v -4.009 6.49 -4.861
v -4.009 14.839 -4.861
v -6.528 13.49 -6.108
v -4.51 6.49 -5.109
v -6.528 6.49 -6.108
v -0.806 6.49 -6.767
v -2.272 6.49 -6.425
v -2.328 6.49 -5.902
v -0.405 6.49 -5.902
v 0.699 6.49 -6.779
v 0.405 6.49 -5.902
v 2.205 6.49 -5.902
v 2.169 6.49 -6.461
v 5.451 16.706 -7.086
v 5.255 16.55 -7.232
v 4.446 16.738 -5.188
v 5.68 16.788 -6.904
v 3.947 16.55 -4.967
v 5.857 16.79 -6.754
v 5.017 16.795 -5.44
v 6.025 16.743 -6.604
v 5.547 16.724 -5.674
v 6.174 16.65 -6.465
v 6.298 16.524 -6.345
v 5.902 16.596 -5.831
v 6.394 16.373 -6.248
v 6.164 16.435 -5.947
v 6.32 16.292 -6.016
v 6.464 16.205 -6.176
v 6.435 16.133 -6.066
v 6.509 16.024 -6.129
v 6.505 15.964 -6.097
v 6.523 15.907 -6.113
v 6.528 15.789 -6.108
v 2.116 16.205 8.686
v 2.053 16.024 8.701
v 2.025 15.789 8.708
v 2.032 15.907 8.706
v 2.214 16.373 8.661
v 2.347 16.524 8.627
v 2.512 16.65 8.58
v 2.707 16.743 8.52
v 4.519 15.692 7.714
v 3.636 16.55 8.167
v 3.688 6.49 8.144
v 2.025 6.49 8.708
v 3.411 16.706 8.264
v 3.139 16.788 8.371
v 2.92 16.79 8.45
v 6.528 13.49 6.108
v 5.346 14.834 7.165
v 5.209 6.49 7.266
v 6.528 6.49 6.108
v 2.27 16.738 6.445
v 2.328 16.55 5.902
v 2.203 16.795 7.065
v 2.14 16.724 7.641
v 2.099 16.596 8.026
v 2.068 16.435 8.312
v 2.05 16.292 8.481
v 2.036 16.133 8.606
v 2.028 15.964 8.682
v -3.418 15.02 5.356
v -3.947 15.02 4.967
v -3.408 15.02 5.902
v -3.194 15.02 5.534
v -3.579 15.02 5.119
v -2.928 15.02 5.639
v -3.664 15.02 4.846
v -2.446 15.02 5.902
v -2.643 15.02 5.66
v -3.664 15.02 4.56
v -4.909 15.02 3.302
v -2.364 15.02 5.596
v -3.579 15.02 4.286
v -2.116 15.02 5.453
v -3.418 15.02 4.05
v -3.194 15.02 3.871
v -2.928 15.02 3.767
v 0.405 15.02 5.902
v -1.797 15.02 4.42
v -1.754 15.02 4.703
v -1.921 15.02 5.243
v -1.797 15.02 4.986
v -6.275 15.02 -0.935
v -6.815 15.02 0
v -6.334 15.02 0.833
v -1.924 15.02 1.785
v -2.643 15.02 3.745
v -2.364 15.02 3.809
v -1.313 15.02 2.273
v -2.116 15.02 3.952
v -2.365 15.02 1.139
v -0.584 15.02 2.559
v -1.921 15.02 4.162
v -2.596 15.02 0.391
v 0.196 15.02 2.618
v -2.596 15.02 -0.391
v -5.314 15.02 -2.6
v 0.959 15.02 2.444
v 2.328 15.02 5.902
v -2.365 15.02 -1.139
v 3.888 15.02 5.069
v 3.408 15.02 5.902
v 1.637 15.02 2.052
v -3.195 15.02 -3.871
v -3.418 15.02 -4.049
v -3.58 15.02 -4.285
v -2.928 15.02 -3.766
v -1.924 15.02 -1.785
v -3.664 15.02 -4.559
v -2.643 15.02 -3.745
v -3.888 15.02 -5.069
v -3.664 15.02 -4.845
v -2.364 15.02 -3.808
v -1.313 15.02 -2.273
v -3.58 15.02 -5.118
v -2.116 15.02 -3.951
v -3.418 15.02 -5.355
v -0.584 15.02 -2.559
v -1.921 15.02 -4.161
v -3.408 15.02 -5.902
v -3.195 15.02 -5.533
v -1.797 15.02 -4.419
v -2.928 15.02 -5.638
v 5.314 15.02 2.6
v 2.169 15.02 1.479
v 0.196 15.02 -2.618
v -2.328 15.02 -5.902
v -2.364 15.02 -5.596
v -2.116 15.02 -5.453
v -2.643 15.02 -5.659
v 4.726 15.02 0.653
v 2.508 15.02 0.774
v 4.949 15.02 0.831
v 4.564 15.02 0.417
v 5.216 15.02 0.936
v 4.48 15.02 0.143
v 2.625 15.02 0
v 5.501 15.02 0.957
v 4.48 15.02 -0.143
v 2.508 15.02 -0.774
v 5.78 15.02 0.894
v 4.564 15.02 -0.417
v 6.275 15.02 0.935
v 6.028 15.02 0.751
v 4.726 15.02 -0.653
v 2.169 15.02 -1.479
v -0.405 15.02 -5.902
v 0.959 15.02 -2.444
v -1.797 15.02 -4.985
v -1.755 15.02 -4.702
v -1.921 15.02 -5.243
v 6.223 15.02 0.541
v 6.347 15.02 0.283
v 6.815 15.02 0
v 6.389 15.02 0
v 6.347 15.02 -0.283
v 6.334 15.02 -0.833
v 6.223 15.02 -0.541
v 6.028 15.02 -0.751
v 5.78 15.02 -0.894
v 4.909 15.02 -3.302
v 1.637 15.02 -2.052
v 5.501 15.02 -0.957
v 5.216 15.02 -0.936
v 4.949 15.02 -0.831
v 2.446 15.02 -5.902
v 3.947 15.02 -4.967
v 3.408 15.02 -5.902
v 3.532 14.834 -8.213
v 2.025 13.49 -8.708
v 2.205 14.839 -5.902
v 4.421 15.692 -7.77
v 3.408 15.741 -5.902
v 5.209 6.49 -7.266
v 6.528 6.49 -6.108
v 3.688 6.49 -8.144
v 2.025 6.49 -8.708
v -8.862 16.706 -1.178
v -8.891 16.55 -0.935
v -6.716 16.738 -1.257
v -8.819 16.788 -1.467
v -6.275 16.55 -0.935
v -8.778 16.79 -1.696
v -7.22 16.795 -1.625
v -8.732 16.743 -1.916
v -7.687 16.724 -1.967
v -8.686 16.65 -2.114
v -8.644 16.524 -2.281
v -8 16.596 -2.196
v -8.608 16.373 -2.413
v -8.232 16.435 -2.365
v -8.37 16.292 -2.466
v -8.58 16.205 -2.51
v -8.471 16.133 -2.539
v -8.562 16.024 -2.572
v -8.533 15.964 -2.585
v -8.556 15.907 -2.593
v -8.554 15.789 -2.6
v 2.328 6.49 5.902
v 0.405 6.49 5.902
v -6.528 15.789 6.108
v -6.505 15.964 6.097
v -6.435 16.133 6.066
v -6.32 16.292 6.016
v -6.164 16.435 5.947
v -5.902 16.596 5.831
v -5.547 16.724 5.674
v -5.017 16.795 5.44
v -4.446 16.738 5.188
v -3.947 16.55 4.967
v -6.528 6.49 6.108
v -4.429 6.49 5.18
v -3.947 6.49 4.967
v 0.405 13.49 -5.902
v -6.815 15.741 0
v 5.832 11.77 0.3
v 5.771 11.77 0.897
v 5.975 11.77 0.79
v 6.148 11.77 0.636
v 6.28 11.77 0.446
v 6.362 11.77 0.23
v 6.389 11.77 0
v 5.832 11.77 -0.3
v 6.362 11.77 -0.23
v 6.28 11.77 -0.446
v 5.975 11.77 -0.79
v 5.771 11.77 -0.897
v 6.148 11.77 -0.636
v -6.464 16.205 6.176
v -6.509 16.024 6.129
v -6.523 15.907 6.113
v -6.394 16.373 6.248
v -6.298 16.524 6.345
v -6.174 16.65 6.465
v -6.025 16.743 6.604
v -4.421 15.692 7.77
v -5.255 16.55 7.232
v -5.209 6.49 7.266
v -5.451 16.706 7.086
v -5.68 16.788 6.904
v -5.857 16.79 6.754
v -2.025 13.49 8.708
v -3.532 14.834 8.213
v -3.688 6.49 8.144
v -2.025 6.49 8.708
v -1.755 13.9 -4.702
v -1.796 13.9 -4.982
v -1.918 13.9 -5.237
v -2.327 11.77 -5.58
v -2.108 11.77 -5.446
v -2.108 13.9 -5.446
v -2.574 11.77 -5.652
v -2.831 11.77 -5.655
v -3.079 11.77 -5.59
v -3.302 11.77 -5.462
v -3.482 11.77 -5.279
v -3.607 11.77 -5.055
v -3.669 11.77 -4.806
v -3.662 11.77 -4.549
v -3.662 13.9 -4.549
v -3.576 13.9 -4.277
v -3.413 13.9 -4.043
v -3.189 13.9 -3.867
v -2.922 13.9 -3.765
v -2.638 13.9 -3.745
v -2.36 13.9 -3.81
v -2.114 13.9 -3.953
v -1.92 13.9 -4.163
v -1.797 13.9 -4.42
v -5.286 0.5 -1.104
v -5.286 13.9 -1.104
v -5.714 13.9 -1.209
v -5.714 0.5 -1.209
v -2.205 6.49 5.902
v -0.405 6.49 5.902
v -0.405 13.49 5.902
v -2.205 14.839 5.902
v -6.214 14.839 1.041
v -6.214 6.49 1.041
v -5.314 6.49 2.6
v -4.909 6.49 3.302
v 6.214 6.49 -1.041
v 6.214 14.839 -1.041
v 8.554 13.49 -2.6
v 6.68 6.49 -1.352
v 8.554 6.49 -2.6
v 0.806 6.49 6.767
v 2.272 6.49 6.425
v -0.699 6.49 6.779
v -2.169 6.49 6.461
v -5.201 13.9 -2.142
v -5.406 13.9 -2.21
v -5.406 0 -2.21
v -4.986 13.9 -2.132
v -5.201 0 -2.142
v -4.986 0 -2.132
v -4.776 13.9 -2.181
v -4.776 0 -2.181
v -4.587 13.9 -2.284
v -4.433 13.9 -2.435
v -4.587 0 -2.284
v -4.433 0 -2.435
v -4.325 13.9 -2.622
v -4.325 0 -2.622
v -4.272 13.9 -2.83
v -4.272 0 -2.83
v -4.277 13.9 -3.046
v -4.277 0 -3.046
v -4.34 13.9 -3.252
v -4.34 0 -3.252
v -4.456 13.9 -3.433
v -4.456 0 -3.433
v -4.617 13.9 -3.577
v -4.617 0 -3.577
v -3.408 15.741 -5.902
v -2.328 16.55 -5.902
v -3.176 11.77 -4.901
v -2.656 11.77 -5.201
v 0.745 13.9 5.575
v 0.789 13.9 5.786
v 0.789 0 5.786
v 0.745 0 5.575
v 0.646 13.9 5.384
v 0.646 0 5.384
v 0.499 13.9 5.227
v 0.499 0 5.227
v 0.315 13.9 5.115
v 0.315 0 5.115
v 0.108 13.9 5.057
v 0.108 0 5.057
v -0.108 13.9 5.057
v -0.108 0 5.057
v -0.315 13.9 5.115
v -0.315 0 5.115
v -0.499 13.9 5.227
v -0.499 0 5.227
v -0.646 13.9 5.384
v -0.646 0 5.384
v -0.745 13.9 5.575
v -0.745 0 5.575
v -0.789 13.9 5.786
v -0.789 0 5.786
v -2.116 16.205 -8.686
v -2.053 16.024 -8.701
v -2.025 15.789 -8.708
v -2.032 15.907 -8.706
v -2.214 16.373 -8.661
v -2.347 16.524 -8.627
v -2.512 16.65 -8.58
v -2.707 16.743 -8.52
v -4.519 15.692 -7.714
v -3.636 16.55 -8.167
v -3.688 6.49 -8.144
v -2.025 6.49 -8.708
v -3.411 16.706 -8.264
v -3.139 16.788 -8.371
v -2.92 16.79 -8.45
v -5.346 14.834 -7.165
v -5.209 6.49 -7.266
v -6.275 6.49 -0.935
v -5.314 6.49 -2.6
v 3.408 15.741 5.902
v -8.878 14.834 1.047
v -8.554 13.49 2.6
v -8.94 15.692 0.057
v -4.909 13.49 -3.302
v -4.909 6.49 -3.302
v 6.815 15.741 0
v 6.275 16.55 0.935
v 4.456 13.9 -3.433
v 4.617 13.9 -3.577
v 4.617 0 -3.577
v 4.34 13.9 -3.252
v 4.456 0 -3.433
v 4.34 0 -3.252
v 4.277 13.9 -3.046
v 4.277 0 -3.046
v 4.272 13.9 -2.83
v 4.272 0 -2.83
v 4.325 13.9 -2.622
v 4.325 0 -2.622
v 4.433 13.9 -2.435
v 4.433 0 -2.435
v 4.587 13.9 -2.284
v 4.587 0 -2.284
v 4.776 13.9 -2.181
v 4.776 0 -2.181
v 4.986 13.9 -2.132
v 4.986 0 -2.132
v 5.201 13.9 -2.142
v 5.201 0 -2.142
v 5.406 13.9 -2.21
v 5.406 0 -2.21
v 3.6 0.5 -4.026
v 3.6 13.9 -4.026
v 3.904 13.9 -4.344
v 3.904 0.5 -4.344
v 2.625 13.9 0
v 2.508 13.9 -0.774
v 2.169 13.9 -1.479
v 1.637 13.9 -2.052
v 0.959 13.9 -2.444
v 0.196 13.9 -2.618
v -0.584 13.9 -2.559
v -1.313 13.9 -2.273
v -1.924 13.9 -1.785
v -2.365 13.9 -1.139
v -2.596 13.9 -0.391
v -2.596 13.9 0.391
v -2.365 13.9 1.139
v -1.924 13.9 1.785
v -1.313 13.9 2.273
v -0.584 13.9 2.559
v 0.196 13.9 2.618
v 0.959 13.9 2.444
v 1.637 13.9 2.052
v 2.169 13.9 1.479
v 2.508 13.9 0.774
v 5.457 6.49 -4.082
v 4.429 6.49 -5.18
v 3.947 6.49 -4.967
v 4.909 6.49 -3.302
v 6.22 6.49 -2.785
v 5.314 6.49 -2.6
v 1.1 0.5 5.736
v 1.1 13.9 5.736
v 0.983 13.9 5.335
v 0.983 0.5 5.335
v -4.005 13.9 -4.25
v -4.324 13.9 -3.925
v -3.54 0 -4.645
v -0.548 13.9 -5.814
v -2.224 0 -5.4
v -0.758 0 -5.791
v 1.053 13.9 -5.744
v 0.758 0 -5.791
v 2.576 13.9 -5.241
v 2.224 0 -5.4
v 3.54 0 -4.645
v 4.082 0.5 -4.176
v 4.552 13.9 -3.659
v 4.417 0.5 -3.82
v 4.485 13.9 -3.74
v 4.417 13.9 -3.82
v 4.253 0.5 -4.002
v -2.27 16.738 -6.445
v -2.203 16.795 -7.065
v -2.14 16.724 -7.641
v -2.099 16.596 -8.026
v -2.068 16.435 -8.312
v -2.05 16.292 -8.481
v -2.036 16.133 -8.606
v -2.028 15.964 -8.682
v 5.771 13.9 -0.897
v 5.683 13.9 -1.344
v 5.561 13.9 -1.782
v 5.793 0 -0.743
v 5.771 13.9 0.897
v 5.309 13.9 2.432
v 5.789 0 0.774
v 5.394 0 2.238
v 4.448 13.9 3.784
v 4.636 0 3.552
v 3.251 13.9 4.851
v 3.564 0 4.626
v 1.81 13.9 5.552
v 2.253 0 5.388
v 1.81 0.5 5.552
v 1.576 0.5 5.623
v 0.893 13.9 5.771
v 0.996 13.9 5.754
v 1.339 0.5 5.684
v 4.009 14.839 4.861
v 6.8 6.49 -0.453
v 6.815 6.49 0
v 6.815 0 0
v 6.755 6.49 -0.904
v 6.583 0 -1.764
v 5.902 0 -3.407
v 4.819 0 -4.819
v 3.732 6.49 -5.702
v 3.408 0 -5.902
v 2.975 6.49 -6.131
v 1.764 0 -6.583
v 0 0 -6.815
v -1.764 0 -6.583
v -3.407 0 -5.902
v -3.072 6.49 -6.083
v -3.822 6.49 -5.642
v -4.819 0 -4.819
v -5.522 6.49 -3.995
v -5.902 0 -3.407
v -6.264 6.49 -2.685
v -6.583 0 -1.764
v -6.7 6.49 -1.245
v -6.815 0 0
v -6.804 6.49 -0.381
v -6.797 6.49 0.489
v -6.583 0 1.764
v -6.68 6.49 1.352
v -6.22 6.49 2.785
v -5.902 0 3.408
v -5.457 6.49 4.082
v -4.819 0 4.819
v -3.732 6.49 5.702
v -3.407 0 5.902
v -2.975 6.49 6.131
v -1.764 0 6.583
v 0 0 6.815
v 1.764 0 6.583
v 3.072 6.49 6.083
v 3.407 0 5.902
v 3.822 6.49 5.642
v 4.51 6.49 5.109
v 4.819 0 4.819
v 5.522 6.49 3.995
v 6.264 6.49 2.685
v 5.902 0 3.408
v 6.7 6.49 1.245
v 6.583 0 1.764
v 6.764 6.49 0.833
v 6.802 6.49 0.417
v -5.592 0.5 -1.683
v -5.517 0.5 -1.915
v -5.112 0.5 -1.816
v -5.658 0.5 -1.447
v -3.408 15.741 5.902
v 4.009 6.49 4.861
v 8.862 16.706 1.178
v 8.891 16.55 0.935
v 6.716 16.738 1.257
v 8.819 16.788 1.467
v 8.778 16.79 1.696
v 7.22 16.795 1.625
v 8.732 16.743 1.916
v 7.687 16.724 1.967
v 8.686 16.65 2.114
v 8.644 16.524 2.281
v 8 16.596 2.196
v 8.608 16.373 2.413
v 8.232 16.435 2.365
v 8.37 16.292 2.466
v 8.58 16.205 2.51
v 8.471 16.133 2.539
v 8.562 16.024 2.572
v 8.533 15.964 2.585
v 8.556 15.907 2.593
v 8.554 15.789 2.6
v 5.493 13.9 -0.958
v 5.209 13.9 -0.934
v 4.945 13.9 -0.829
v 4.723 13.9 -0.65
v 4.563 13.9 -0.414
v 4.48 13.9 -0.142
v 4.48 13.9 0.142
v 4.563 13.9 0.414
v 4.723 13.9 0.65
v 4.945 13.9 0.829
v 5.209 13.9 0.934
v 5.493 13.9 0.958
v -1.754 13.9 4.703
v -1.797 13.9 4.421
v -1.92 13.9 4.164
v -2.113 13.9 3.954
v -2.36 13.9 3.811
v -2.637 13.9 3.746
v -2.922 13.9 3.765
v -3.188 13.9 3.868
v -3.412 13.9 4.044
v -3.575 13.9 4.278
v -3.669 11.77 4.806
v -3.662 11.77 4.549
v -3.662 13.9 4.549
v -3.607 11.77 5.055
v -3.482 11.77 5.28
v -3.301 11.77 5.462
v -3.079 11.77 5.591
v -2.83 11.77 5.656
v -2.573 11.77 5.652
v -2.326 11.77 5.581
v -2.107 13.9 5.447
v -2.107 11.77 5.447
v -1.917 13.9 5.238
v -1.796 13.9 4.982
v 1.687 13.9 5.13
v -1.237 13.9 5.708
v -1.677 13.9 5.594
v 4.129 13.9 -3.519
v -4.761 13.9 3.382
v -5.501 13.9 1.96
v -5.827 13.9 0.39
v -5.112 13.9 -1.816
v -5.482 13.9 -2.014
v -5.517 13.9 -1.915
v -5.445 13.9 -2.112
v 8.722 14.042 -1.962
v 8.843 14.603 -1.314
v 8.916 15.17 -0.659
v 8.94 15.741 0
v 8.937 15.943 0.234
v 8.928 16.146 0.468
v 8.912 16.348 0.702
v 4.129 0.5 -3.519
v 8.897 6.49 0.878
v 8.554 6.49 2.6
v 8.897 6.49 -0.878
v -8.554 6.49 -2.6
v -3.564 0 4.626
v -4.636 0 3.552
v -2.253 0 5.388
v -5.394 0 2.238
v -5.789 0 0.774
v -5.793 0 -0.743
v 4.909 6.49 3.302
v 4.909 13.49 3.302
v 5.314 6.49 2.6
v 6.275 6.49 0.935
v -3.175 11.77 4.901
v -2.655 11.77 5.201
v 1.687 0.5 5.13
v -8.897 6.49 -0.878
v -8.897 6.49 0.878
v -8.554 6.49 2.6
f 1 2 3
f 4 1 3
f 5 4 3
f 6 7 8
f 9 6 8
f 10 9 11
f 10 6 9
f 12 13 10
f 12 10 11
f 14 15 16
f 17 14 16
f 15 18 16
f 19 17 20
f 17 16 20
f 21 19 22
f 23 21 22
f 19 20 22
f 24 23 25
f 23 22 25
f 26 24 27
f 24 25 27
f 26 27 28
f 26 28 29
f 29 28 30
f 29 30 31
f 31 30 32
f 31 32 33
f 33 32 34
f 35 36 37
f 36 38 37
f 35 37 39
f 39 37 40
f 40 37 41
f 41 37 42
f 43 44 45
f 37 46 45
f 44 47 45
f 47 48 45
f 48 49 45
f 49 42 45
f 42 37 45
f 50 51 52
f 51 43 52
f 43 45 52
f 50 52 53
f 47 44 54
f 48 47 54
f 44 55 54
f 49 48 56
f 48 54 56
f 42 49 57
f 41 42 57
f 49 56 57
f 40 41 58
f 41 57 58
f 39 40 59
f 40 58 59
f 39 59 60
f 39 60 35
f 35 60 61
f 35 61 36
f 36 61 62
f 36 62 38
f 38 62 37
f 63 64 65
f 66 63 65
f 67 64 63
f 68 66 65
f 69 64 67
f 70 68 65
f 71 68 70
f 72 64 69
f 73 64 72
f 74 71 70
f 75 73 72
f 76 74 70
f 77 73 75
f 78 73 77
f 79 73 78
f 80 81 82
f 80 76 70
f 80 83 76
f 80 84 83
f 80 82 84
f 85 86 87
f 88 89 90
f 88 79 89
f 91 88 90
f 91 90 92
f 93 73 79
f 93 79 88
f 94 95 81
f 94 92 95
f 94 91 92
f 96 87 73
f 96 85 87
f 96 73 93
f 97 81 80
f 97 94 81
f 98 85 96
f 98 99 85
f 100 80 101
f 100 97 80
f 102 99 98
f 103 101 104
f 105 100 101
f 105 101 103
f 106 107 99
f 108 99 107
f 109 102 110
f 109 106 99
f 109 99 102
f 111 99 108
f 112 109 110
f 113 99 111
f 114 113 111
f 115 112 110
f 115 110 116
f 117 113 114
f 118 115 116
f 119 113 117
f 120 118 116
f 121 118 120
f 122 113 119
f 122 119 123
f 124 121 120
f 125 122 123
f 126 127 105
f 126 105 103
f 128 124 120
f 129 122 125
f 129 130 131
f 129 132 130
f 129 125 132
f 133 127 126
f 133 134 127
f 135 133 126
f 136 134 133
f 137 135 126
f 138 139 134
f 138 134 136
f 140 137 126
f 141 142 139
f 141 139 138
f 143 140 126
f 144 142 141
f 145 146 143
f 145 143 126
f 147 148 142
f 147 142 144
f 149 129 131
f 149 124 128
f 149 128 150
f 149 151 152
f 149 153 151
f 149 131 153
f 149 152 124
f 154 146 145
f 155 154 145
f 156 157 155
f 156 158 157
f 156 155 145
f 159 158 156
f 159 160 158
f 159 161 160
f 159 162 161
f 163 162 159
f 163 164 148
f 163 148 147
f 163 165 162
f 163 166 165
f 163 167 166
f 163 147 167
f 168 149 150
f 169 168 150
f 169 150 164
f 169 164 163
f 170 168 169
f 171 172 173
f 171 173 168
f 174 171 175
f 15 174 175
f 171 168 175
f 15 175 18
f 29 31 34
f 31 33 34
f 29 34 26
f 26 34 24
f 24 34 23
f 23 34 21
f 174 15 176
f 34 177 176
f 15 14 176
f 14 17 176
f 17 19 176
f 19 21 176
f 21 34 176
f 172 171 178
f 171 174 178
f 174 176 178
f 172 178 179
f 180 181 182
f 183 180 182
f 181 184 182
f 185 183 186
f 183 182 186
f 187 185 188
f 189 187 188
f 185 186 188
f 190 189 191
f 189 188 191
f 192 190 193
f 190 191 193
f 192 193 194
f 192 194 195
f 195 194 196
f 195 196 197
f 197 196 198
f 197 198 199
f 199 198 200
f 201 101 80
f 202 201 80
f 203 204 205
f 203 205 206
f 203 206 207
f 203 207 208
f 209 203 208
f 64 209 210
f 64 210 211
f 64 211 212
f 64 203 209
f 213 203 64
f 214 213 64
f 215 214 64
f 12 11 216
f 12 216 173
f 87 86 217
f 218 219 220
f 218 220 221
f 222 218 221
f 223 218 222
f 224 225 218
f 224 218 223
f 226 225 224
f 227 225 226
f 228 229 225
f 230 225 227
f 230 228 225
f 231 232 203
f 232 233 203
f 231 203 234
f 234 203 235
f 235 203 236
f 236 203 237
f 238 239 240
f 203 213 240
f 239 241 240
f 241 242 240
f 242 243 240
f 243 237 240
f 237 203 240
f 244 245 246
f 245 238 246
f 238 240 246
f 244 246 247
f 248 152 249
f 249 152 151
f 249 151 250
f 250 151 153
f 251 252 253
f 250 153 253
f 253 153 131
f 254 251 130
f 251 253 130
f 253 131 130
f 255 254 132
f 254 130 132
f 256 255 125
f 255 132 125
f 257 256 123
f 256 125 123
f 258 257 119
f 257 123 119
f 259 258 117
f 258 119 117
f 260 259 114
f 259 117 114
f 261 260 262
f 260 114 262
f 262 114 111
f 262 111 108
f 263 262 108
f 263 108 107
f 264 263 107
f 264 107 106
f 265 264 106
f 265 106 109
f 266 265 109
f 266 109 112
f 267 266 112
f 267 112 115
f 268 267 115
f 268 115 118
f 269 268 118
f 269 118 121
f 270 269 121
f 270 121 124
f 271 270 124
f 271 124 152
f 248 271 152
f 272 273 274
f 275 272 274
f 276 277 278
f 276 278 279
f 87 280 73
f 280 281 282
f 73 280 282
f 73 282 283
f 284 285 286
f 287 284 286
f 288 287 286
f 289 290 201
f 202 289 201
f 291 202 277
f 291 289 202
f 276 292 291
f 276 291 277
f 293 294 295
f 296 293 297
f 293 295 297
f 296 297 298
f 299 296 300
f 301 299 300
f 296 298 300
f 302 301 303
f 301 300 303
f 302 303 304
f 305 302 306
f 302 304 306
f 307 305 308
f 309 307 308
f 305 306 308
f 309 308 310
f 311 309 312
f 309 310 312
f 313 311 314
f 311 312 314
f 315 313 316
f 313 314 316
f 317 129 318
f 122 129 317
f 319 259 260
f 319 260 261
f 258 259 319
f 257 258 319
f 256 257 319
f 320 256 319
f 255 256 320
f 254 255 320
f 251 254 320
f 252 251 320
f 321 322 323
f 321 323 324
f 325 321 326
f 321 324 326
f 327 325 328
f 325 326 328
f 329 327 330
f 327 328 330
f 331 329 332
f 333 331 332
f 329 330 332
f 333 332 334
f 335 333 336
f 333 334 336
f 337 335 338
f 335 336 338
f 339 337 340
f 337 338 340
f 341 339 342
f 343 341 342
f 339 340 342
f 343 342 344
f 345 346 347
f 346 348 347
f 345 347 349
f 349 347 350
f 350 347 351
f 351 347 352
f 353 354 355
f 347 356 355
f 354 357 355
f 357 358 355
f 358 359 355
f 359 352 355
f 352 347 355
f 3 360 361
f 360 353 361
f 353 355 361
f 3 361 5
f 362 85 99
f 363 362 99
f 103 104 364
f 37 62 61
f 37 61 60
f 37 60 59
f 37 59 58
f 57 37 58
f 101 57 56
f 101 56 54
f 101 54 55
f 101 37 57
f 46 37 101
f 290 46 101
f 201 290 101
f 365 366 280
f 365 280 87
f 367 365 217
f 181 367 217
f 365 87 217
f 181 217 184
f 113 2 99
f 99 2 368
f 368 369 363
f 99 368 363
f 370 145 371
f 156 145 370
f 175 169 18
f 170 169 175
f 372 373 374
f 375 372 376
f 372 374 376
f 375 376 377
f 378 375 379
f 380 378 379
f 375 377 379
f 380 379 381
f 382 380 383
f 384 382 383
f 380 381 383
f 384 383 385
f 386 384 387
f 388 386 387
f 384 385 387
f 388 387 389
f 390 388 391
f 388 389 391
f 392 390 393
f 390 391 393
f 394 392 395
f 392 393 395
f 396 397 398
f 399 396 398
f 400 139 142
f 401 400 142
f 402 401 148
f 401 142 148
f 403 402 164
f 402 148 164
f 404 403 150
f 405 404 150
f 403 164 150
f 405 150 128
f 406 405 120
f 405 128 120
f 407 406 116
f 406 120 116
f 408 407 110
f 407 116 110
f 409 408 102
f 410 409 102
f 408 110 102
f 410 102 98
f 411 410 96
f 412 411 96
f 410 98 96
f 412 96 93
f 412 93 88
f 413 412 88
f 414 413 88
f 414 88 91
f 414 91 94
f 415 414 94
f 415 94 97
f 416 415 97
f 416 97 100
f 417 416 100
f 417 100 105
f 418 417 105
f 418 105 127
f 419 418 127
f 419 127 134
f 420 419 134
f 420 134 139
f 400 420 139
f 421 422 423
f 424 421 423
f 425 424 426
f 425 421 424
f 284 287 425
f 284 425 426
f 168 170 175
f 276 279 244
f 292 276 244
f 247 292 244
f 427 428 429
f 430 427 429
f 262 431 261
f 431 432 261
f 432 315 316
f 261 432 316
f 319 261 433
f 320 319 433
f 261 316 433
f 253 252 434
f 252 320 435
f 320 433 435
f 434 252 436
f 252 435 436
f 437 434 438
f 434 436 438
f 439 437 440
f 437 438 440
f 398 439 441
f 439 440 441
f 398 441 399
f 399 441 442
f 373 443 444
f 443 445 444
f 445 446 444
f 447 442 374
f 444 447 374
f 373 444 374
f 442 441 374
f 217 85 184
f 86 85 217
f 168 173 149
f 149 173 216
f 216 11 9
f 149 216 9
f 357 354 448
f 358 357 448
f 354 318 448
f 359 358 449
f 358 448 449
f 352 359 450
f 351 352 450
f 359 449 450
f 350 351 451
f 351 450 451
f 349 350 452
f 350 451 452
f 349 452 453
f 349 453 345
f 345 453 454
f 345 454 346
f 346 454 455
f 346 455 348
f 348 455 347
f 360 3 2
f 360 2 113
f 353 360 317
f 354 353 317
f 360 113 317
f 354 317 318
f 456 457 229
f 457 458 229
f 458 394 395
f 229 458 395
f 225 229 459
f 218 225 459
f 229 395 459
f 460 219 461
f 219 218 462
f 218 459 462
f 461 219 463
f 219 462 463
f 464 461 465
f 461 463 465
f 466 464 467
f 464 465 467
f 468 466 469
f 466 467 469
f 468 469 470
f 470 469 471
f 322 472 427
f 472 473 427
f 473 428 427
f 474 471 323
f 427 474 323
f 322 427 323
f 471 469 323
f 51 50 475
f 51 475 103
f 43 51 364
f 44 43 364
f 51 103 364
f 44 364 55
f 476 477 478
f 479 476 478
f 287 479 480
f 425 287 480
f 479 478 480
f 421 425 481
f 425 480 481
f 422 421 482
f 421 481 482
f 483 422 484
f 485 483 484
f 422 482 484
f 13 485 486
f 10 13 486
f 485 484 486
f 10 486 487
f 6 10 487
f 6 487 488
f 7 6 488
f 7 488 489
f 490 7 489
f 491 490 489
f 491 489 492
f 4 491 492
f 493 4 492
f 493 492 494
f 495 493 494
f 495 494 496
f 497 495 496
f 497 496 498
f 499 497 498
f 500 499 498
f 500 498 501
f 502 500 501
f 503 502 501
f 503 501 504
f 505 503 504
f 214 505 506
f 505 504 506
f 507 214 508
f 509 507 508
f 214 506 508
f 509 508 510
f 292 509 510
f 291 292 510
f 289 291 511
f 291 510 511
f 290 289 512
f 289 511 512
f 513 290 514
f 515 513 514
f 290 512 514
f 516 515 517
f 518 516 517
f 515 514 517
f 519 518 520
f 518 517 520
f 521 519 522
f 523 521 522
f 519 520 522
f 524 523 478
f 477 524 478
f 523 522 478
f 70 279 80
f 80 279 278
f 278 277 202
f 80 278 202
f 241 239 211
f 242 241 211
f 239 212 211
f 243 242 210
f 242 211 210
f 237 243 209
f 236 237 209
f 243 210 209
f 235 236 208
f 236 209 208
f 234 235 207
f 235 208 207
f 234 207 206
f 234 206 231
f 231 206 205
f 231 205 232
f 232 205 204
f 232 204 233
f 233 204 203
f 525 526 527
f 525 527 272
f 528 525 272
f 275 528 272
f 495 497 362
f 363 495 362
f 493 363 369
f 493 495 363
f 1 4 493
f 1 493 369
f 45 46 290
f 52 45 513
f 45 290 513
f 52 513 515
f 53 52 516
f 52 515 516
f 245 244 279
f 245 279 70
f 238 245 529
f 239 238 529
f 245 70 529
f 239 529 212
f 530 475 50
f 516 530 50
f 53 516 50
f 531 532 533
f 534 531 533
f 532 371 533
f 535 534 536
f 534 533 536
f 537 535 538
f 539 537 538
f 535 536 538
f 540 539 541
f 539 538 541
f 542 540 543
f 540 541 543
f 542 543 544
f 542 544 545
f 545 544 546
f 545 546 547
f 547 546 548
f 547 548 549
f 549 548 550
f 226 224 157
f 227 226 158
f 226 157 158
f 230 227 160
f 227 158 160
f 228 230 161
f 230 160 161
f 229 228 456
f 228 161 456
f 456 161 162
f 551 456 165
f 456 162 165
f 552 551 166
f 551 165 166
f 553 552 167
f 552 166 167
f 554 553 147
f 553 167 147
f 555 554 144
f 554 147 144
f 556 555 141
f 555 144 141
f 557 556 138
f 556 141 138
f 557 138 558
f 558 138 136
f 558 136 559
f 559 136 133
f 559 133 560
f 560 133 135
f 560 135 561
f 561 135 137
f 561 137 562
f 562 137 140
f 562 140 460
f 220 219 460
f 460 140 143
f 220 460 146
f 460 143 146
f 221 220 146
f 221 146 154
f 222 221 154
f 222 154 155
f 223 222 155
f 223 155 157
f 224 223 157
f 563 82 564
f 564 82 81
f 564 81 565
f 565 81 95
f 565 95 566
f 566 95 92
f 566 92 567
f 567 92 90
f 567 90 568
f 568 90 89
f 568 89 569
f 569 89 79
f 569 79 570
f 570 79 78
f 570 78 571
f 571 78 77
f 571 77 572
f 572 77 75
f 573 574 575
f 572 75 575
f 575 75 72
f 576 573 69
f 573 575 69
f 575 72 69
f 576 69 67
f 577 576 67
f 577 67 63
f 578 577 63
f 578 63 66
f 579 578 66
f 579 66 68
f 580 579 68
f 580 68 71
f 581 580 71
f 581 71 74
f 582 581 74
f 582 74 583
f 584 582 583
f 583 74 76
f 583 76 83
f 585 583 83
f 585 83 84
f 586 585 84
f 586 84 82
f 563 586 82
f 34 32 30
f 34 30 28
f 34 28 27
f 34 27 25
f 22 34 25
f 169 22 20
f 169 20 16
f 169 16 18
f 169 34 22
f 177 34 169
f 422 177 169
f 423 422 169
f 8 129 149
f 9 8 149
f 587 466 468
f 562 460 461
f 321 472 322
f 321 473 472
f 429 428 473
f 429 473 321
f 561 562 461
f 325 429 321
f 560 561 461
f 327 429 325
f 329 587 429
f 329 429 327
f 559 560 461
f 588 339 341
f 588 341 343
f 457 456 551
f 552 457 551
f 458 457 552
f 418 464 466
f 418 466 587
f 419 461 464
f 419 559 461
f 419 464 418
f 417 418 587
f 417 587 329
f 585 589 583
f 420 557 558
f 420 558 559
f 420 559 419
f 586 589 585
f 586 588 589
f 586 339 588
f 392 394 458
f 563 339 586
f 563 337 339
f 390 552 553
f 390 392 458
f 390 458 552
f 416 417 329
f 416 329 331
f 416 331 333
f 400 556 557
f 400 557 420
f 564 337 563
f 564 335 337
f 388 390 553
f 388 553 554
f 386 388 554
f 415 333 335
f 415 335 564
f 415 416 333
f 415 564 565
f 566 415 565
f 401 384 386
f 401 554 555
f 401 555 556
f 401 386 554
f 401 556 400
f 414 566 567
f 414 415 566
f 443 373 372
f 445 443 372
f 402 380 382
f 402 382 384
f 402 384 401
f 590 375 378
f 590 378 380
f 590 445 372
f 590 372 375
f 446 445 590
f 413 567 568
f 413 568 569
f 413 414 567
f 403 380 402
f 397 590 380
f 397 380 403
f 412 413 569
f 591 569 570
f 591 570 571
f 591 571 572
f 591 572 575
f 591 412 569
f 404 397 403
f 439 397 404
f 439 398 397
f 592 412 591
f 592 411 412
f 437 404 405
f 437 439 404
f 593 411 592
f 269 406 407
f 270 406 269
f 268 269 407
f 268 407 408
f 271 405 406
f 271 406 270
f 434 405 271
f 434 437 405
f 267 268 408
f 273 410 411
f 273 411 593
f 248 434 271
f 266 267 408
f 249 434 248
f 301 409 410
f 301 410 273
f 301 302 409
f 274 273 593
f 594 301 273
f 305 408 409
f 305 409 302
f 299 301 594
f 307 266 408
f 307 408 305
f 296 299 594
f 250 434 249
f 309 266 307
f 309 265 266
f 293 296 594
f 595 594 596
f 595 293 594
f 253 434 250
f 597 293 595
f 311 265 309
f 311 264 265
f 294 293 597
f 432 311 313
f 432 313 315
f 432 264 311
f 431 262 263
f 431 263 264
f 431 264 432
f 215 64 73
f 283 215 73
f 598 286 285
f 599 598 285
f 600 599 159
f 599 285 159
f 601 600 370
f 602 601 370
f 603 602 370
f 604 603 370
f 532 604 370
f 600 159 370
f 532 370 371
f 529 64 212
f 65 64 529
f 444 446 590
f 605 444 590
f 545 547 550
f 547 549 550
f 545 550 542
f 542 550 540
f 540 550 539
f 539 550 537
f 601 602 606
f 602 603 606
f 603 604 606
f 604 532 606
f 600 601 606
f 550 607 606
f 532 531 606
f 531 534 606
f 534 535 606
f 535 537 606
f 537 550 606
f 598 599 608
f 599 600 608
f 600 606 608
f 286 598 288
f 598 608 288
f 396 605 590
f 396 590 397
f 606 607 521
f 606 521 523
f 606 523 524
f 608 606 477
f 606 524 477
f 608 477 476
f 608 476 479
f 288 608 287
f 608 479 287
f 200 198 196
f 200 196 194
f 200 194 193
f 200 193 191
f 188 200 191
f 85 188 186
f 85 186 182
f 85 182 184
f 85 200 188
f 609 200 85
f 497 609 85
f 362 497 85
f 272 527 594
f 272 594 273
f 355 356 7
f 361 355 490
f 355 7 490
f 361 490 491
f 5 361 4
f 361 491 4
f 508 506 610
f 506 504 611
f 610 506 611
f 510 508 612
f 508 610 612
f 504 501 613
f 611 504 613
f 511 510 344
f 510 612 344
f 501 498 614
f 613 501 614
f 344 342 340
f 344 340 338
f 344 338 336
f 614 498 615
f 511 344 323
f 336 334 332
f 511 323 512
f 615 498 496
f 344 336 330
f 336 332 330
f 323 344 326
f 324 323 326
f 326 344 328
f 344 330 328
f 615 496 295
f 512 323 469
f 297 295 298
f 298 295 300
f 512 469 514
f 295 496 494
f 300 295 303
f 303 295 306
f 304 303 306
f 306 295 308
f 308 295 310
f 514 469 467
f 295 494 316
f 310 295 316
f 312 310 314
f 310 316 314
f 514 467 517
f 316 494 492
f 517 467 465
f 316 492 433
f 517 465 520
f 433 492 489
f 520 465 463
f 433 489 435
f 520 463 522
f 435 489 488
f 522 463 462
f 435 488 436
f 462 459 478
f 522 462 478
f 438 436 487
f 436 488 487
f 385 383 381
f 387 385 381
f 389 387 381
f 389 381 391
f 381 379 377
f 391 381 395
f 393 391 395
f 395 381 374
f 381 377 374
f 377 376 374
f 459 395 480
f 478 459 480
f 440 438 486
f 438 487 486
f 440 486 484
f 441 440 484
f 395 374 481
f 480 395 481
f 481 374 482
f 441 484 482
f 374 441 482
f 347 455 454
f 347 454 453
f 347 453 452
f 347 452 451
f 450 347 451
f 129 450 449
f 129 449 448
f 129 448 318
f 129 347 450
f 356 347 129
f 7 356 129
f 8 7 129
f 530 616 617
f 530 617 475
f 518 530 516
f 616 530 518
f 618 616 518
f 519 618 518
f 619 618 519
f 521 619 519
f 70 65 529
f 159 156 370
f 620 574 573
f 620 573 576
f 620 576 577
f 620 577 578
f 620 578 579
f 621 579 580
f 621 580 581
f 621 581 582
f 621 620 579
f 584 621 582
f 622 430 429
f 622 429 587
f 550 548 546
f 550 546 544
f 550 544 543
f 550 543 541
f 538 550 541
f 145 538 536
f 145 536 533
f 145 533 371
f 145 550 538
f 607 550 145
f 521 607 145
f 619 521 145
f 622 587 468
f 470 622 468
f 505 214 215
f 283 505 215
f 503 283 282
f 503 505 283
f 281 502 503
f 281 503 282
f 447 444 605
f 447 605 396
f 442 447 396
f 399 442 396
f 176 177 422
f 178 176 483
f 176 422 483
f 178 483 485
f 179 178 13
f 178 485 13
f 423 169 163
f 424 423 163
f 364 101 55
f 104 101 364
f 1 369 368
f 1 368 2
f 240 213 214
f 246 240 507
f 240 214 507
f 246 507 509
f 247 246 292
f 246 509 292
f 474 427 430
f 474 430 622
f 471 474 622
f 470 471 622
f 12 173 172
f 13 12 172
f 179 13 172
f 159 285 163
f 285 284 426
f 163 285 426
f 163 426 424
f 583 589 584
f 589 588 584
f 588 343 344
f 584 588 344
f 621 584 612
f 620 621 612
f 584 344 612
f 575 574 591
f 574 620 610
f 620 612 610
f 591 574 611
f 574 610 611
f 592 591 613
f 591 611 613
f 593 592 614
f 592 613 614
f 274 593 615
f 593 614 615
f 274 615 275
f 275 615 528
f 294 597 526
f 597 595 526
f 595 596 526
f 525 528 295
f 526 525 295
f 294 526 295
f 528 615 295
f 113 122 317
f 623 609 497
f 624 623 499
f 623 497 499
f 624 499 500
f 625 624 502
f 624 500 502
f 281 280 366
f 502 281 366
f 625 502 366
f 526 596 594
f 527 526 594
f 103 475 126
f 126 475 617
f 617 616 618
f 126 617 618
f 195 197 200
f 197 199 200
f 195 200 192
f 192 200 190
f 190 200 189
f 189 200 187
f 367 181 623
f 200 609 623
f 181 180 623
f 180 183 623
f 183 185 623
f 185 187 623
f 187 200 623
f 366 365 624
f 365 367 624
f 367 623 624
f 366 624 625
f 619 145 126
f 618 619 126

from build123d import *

# Parameters (mm, degrees)
SKETCH1_R               = 6.815
BOSS_EXTRUDE1_DEPTH     = 6.49
BOSS_EXTRUDE2_DEPTH     = 8.53
BOSS_EXTRUDE3_DEPTH     = 10
CIRPATTERN1_COUNT       = 6
SKETCH4_R               = 10.914422046
SKETCH4_R_2             = 8.94
CUT_EXTRUDE1_DEPTH      = 18
CUT_EXTRUDE2_DEPTH      = 18
CUT_EXTRUDE4_DEPTH      = 11.305565513
CIRPATTERN2_COUNT       = 6
SKETCH8_R               = 2.625
CUT_EXTRUDE5_DEPTH      = 2.775565513
CUT_EXTRUDE5_DEPTH_BACK = 16.02
SKETCH9_R               = 5.84
CUT_EXTRUDE6_DEPTH      = 13.9
BOSS_EXTRUDE4_DEPTH     = 13.9
CIRPATTERN3_COUNT       = 3
BOSS_EXTRUDE5_DEPTH     = 13.4
CIRPATTERN4_COUNT       = 3
SKETCH12_R              = 0.96
CUT_EXTRUDE7_DEPTH      = 3.25


with BuildPart() as part:
    # Sketch1 → Boss-Extrude1 (new body)
    with BuildSketch(Plane(origin=(0, 0, 0), x_dir=(1, 0, 0), z_dir=(0, 1, 0))):
        Circle(SKETCH1_R)
    extrude(amount=BOSS_EXTRUDE1_DEPTH)

    # Sketch2 → Boss-Extrude2 (add)
    with BuildSketch(Plane(origin=(0, 6.49, 0), x_dir=(1, 0, 0), z_dir=(0, 1, 0))):
        Polygon((3.4075, 5.901963127), (-3.4075, 5.901963127), (-6.815, 0), (-3.4075, -5.901963127), (3.4075, -5.901963127), (6.815, 0), align=None)
    extrude(amount=BOSS_EXTRUDE2_DEPTH)

    # Sketch3 → Boss-Extrude3 (add)
    with BuildSketch(Plane(origin=(0, 0, 0), x_dir=(0, 0, -1), z_dir=(1, 0, 0))):
        with BuildLine():
            Line((-2.6, 6.49), (2.6, 6.49))
            Line((2.6, 6.49), (2.6, 13.49))
            Line((2.6, 13.49), (-0.934676019, 16.550017775))
            ThreePointArc((-0.934676019, 16.550017775), (-2.011804271, 16.704512725), (-2.6, 15.789034847))
            Line((-2.6, 15.789034847), (-2.6, 13.49))
            Line((-2.6, 13.49), (-2.6, 6.49))
        make_face()
    boss_extrude3 = extrude(amount=BOSS_EXTRUDE3_DEPTH)

    # CirPattern1: Boss-Extrude3 ×6 about axis
    cirpattern1_axis = Axis((0, 0, 0), (0, 1, 0))
    for i in range(1, CIRPATTERN1_COUNT):
        add(boss_extrude3.rotate(cirpattern1_axis, i * 360 / CIRPATTERN1_COUNT))

    # Sketch4 → Cut-Extrude1 (cut)
    with BuildSketch(Plane(origin=(0, 0, 0), x_dir=(1, 0, 0), z_dir=(0, 1, 0))):
        Circle(SKETCH4_R)
        Circle(SKETCH4_R_2, mode=Mode.SUBTRACT)
    extrude(amount=CUT_EXTRUDE1_DEPTH, mode=Mode.SUBTRACT)

    # Sketch5 → Cut-Extrude2 (cut)
    with BuildSketch(Plane(origin=(0, 15.02, 0), x_dir=(1, 0, 0), z_dir=(0, 1, 0))):
        Polygon((-3.4075, 5.901963127), (-6.815, 0), (-3.4075, -5.901963127), (3.4075, -5.901963127), (6.815, 0), (3.4075, 5.901963127), align=None)
    extrude(amount=CUT_EXTRUDE2_DEPTH, mode=Mode.SUBTRACT)

    # Sketch7 → Cut-Extrude4 (cut, through all)
    with BuildSketch(Plane(origin=(0, 6.49, 0), x_dir=(1, 0, 0), z_dir=(0, 1, 0))):
        Polygon((-6.213841686, -1.041236743), (-8.553572353, -2.6), (-5.3138893, -2.6), align=None)
        Polygon((-8.553572353, 2.6), (-6.275364549, 0.934676019), (-5.3138893, 2.6), align=None)
    cut_extrude4 = extrude(amount=CUT_EXTRUDE4_DEPTH, mode=Mode.SUBTRACT)

    # CirPattern2: Cut-Extrude4 ×6 about axis
    cirpattern2_axis = Axis((0, 0, 0), (0, 1, 0))
    for i in range(1, CIRPATTERN2_COUNT):
        add(cut_extrude4.rotate(cirpattern2_axis, i * 360 / CIRPATTERN2_COUNT), mode=Mode.SUBTRACT)

    # Sketch8 → Cut-Extrude5 (cut, two sides)
    with BuildSketch(Plane(origin=(0, 15.02, 0), x_dir=(1, 0, 0), z_dir=(0, 1, 0))) as cut_extrude5_sk:
        Circle(SKETCH8_R)
    extrude(amount=CUT_EXTRUDE5_DEPTH, mode=Mode.SUBTRACT)
    extrude(cut_extrude5_sk.sketch, amount=-CUT_EXTRUDE5_DEPTH_BACK, mode=Mode.SUBTRACT)

    # Sketch9 → Cut-Extrude6 (cut)
    with BuildSketch(Plane(origin=(0, 0, 0), x_dir=(-1, 0, 0), z_dir=(0, -1, 0))):
        Circle(SKETCH9_R)
    extrude(amount=-CUT_EXTRUDE6_DEPTH, mode=Mode.SUBTRACT)

    # Sketch10 → Boss-Extrude4 (add)
    with BuildSketch(Plane(origin=(0, 0, 0), x_dir=(1, 0, 0), z_dir=(0, 1, 0))):
        with BuildLine():
            Line((-0.790866214, -5.84), (0.790866214, -5.84))
            ThreePointArc((0.790866214, -5.84), (0, -5.049133786), (-0.790866214, -5.84))
        make_face()
    boss_extrude4 = extrude(amount=BOSS_EXTRUDE4_DEPTH)

    # CirPattern3: Boss-Extrude4 ×3 about axis
    cirpattern3_axis = Axis((0, 0, 0), (0, 1, 0))
    for i in range(1, CIRPATTERN3_COUNT):
        add(boss_extrude4.rotate(cirpattern3_axis, i * 360 / CIRPATTERN3_COUNT))

    # Sketch11 → Boss-Extrude5 (add)
    with BuildSketch(Plane.XZ.offset(-13.9)):
        Polygon((1.104876589, 5.753522427), (0.982953313, 5.335499767), (1.686743969, 5.130227492), (1.811594174, 5.558285339), align=None)
    boss_extrude5 = extrude(amount=BOSS_EXTRUDE5_DEPTH)

    # CirPattern4: Boss-Extrude5 ×3 about axis
    cirpattern4_axis = Axis((0, 0, 0), (0, 1, 0))
    for i in range(1, CIRPATTERN4_COUNT):
        add(boss_extrude5.rotate(cirpattern4_axis, i * 360 / CIRPATTERN4_COUNT))

    # Sketch12 → Cut-Extrude7 (cut)
    with BuildSketch(Plane(origin=(0, 15.02, 0), x_dir=(1, 0, 0), z_dir=(0, 1, 0))):
        with Locations((-2.714264925, -4.702681498)):
            Circle(SKETCH12_R)
        with Locations((-2.714679677, 4.701963127)):
            Circle(SKETCH12_R)
        with Locations((5.429359354, 0)):
            Circle(SKETCH12_R)
    extrude(amount=-CUT_EXTRUDE7_DEPTH, mode=Mode.SUBTRACT)


solid = part.part
